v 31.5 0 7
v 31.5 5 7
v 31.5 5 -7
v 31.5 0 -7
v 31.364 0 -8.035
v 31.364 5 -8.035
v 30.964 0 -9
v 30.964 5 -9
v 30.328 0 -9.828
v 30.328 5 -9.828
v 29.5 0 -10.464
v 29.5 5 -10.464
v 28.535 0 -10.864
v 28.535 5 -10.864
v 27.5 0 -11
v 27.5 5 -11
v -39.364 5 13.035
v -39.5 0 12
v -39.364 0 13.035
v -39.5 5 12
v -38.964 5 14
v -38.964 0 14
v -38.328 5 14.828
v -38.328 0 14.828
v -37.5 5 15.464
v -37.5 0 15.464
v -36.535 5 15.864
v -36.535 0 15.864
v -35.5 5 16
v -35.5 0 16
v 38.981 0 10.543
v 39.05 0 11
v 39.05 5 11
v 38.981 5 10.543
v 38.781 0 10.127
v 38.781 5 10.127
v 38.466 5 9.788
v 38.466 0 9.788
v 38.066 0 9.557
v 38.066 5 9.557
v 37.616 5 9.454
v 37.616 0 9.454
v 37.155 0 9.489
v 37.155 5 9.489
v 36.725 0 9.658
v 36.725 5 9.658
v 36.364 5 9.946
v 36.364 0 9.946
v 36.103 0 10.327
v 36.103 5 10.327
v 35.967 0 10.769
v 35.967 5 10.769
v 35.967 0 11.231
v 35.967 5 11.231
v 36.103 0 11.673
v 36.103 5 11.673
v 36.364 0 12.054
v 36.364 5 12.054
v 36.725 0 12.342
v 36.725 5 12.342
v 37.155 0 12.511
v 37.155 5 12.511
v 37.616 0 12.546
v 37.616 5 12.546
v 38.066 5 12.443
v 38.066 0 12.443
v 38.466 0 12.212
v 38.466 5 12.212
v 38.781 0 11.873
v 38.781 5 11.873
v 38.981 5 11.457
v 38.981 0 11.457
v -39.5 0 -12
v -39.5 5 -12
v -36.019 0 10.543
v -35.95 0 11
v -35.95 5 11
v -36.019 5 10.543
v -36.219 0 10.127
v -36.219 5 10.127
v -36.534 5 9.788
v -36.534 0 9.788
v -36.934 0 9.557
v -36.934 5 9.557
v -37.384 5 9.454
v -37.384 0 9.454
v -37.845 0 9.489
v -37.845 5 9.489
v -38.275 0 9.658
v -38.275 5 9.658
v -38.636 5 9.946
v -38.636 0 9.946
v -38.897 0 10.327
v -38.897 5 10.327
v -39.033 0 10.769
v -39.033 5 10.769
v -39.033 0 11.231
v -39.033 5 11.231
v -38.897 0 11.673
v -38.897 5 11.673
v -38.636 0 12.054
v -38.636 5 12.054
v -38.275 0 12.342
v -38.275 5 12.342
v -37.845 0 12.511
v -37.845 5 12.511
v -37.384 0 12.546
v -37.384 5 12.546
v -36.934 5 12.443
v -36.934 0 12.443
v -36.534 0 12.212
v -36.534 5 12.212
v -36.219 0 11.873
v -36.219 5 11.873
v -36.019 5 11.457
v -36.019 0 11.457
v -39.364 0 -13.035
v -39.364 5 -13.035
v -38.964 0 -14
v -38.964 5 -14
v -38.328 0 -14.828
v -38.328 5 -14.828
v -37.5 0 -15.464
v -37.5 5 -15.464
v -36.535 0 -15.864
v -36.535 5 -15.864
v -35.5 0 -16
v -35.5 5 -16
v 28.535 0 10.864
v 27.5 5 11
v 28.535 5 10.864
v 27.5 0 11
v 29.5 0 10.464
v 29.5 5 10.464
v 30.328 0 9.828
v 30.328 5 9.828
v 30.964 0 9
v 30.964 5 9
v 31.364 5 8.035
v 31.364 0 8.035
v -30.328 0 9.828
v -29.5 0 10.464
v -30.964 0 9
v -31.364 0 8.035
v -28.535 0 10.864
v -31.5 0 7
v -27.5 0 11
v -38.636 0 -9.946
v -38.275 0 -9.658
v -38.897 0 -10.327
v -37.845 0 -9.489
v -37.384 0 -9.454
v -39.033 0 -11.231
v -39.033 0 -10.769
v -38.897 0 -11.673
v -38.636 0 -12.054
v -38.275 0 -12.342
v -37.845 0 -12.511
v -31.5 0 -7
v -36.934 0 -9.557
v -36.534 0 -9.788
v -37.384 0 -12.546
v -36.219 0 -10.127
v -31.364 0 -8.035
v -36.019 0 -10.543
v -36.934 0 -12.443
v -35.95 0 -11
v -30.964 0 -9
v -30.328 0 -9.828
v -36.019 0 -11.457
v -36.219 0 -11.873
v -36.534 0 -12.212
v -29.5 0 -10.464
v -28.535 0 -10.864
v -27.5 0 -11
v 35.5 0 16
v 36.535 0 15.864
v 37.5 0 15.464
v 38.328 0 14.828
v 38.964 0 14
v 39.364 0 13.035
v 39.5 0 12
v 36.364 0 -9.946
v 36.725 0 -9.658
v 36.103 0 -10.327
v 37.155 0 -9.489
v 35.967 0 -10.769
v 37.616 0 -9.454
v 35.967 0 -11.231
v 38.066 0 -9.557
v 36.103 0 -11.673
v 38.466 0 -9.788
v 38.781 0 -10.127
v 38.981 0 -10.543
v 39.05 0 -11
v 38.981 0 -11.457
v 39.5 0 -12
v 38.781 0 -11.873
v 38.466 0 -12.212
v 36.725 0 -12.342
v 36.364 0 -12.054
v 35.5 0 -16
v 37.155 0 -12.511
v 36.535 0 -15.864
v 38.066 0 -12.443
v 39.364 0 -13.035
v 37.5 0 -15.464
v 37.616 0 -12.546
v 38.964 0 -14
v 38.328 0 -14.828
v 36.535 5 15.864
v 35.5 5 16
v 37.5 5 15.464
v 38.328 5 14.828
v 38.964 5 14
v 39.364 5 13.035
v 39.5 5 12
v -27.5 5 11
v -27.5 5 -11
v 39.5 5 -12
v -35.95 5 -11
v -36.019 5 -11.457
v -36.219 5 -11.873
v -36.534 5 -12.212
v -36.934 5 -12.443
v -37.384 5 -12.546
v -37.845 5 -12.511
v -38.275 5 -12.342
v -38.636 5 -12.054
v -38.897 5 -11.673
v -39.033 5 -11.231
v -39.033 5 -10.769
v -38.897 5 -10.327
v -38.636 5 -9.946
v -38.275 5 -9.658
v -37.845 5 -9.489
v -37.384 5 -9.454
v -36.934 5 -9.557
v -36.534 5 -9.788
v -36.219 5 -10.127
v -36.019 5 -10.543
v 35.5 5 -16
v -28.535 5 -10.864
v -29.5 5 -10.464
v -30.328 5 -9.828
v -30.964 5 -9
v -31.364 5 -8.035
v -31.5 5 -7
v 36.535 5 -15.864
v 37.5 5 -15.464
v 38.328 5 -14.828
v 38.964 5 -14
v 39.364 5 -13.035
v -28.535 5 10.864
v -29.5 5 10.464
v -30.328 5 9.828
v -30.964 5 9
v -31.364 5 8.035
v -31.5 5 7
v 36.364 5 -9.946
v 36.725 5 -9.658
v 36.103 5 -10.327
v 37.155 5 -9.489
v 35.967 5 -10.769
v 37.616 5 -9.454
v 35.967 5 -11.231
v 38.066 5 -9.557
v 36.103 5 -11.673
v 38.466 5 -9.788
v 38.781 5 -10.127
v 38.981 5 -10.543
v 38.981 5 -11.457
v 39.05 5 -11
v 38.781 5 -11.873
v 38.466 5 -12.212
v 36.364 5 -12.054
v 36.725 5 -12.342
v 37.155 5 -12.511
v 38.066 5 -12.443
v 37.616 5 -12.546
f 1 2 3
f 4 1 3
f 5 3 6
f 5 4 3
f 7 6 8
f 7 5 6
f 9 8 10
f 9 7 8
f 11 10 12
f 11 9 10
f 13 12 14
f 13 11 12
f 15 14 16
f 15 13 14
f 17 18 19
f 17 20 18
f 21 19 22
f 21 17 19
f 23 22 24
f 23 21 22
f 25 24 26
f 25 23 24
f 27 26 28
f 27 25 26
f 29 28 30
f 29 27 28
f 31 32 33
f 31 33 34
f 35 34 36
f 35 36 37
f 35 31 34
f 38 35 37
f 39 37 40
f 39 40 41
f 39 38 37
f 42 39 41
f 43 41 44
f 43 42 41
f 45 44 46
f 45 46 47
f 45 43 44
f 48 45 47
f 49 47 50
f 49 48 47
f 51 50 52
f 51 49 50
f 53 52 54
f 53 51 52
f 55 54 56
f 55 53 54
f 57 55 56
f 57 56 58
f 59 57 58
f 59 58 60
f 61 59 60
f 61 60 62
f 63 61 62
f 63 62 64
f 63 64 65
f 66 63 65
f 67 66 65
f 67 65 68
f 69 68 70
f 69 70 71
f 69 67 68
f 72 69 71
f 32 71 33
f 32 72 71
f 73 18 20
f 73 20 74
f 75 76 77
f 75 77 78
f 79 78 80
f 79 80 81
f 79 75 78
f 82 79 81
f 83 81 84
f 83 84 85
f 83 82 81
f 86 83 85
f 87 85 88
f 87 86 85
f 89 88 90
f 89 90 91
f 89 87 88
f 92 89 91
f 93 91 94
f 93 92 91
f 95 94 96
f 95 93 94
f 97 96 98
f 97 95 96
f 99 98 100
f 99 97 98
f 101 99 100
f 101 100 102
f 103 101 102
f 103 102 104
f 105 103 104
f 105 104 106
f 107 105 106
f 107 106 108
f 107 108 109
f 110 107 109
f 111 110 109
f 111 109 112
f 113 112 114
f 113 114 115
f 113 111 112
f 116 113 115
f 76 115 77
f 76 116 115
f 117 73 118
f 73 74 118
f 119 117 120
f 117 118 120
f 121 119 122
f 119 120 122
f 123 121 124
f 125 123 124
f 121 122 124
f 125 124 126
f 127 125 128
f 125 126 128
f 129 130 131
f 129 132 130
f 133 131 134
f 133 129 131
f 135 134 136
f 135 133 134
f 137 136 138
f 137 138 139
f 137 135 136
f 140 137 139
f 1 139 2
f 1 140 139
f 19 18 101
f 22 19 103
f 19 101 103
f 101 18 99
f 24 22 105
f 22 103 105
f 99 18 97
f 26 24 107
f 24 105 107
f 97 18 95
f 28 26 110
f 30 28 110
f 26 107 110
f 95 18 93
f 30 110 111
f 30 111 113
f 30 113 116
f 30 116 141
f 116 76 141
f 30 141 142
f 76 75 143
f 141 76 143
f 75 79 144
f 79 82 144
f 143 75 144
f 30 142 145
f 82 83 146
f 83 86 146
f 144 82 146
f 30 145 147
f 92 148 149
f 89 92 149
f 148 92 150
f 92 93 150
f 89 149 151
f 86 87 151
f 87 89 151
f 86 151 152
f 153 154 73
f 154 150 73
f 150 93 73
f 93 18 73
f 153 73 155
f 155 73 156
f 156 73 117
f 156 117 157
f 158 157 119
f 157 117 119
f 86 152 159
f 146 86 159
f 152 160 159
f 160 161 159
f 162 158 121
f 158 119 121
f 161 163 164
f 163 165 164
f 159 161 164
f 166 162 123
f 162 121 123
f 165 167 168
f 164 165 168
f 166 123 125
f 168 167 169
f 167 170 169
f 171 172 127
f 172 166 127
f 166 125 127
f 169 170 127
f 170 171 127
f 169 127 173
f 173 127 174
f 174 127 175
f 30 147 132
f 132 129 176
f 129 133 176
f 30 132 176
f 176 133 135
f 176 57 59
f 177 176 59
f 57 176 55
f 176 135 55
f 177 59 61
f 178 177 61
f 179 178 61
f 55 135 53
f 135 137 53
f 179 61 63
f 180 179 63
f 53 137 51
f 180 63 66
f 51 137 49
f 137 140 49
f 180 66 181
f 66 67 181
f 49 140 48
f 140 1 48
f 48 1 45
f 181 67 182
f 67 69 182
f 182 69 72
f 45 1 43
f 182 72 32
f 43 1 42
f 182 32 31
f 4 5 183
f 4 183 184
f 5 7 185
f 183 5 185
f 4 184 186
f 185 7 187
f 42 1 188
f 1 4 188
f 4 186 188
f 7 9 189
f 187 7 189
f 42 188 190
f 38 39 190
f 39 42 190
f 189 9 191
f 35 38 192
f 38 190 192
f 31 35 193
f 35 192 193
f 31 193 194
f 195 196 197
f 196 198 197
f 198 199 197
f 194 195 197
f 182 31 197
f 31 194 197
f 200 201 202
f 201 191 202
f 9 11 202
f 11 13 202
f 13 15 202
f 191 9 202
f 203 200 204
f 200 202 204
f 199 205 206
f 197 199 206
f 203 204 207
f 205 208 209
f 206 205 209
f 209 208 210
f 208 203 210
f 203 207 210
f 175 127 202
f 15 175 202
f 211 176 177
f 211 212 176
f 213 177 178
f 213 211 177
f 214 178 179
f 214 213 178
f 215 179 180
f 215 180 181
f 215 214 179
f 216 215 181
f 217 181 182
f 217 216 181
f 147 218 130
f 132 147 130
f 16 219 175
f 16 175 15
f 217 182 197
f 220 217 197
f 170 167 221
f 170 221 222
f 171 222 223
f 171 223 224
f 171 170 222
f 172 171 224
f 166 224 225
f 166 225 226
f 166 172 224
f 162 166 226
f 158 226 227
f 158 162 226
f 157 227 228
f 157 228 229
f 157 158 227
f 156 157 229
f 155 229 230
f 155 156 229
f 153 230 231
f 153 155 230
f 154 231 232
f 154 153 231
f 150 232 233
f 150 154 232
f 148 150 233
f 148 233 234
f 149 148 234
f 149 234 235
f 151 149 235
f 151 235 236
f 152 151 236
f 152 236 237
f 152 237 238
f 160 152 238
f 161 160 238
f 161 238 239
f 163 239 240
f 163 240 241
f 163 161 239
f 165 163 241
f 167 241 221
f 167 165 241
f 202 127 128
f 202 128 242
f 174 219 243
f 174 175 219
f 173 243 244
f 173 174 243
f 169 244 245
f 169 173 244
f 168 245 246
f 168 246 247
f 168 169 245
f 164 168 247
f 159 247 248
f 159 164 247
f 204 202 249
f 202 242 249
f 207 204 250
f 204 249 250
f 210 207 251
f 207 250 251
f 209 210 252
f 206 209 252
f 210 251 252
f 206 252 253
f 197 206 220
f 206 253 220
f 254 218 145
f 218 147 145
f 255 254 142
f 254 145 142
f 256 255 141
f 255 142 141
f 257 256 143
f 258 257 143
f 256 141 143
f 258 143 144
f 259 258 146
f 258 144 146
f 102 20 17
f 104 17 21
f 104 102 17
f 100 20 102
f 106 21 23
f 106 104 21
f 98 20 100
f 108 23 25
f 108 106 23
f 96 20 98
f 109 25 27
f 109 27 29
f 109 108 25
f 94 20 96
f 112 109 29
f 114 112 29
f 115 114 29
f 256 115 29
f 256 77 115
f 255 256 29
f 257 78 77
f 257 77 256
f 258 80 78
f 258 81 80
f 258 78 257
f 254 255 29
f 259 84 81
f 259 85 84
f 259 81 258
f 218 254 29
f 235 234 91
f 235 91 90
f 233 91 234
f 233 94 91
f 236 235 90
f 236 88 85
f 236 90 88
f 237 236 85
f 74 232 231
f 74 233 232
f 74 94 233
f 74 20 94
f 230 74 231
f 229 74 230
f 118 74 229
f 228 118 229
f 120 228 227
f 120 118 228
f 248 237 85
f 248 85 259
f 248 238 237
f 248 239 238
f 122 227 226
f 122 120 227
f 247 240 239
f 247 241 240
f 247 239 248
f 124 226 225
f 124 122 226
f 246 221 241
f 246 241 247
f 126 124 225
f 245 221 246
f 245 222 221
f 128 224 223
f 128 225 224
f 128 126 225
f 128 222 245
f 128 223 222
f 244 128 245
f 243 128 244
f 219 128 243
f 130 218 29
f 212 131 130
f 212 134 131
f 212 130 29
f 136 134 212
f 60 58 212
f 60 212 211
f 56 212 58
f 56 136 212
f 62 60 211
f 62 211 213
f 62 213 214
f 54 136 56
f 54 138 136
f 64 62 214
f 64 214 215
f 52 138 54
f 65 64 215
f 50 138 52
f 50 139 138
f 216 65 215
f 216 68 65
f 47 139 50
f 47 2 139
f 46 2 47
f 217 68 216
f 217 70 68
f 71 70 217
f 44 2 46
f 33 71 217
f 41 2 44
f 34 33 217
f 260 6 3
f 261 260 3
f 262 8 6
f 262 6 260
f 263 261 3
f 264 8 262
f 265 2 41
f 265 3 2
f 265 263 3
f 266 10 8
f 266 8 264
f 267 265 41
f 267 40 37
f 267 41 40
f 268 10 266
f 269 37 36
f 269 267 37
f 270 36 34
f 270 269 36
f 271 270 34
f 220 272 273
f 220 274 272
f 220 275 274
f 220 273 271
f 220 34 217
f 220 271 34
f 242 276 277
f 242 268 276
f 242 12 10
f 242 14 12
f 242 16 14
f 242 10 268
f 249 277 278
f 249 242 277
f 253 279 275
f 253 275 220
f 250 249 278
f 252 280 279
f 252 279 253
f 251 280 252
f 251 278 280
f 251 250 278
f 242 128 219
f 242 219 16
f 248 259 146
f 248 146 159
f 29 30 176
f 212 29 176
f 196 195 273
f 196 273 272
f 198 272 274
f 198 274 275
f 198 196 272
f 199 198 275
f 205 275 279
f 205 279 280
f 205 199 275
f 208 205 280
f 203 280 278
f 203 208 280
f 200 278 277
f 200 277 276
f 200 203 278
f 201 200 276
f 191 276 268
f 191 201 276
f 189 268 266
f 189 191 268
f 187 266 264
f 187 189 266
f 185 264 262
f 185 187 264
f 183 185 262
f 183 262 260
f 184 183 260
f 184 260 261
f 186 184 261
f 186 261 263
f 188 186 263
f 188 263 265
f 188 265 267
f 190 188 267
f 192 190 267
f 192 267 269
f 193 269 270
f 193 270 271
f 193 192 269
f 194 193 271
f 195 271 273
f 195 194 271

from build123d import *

# Parameters (mm, degrees)
SKETCH_1_W          = 79
SKETCH_1_H          = 32
SKETCH_1_R          = 1.55
EXTRUDE_1_DEPTH     = 5
FILLET_1_R          = 4
SKETCH_2_W          = 63
SKETCH_2_H          = 22
CUT_EXTRUDE_1_DEPTH = 6
FILLET_2_R          = 4


with BuildPart() as part:
    # 草图1 → 凸台-拉伸1 (new body)
    with BuildSketch(Plane(origin=(0, 0, 0), x_dir=(1, 0, 0), z_dir=(0, 1, 0))):
        Rectangle(SKETCH_1_W, SKETCH_1_H)
        with Locations((-37.5, 11)):
            Circle(SKETCH_1_R, mode=Mode.SUBTRACT)
        with Locations((-37.5, -11)):
            Circle(SKETCH_1_R, mode=Mode.SUBTRACT)
        with Locations((37.5, 11)):
            Circle(SKETCH_1_R, mode=Mode.SUBTRACT)
        with Locations((37.5, -11)):
            Circle(SKETCH_1_R, mode=Mode.SUBTRACT)
    extrude(amount=EXTRUDE_1_DEPTH)

    # 圆角1
    fillet_1_edges = [part.edges().sort_by_distance(p)[0] for p in [
        (39.5, 2.5, 16),
        (-39.5, 2.5, 16),
        (-39.5, 2.5, -16),
        (39.5, 2.5, -16),
    ]]
    fillet(fillet_1_edges, radius=FILLET_1_R)

    # 草图2 → 切除-拉伸1 (cut, through all)
    with BuildSketch(Plane(origin=(0, 5, 0), x_dir=(1, 0, 0), z_dir=(0, 1, 0))):
        Rectangle(SKETCH_2_W, SKETCH_2_H)
    extrude(amount=-CUT_EXTRUDE_1_DEPTH, mode=Mode.SUBTRACT)

    # 圆角2
    fillet_2_edges = [part.edges().sort_by_distance(p)[0] for p in [
        (31.5, 2.5, -11),
        (31.5, 2.5, 11),
        (-31.5, 2.5, 11),
        (-31.5, 2.5, -11),
    ]]
    fillet(fillet_2_edges, radius=FILLET_2_R)


solid = part.part
